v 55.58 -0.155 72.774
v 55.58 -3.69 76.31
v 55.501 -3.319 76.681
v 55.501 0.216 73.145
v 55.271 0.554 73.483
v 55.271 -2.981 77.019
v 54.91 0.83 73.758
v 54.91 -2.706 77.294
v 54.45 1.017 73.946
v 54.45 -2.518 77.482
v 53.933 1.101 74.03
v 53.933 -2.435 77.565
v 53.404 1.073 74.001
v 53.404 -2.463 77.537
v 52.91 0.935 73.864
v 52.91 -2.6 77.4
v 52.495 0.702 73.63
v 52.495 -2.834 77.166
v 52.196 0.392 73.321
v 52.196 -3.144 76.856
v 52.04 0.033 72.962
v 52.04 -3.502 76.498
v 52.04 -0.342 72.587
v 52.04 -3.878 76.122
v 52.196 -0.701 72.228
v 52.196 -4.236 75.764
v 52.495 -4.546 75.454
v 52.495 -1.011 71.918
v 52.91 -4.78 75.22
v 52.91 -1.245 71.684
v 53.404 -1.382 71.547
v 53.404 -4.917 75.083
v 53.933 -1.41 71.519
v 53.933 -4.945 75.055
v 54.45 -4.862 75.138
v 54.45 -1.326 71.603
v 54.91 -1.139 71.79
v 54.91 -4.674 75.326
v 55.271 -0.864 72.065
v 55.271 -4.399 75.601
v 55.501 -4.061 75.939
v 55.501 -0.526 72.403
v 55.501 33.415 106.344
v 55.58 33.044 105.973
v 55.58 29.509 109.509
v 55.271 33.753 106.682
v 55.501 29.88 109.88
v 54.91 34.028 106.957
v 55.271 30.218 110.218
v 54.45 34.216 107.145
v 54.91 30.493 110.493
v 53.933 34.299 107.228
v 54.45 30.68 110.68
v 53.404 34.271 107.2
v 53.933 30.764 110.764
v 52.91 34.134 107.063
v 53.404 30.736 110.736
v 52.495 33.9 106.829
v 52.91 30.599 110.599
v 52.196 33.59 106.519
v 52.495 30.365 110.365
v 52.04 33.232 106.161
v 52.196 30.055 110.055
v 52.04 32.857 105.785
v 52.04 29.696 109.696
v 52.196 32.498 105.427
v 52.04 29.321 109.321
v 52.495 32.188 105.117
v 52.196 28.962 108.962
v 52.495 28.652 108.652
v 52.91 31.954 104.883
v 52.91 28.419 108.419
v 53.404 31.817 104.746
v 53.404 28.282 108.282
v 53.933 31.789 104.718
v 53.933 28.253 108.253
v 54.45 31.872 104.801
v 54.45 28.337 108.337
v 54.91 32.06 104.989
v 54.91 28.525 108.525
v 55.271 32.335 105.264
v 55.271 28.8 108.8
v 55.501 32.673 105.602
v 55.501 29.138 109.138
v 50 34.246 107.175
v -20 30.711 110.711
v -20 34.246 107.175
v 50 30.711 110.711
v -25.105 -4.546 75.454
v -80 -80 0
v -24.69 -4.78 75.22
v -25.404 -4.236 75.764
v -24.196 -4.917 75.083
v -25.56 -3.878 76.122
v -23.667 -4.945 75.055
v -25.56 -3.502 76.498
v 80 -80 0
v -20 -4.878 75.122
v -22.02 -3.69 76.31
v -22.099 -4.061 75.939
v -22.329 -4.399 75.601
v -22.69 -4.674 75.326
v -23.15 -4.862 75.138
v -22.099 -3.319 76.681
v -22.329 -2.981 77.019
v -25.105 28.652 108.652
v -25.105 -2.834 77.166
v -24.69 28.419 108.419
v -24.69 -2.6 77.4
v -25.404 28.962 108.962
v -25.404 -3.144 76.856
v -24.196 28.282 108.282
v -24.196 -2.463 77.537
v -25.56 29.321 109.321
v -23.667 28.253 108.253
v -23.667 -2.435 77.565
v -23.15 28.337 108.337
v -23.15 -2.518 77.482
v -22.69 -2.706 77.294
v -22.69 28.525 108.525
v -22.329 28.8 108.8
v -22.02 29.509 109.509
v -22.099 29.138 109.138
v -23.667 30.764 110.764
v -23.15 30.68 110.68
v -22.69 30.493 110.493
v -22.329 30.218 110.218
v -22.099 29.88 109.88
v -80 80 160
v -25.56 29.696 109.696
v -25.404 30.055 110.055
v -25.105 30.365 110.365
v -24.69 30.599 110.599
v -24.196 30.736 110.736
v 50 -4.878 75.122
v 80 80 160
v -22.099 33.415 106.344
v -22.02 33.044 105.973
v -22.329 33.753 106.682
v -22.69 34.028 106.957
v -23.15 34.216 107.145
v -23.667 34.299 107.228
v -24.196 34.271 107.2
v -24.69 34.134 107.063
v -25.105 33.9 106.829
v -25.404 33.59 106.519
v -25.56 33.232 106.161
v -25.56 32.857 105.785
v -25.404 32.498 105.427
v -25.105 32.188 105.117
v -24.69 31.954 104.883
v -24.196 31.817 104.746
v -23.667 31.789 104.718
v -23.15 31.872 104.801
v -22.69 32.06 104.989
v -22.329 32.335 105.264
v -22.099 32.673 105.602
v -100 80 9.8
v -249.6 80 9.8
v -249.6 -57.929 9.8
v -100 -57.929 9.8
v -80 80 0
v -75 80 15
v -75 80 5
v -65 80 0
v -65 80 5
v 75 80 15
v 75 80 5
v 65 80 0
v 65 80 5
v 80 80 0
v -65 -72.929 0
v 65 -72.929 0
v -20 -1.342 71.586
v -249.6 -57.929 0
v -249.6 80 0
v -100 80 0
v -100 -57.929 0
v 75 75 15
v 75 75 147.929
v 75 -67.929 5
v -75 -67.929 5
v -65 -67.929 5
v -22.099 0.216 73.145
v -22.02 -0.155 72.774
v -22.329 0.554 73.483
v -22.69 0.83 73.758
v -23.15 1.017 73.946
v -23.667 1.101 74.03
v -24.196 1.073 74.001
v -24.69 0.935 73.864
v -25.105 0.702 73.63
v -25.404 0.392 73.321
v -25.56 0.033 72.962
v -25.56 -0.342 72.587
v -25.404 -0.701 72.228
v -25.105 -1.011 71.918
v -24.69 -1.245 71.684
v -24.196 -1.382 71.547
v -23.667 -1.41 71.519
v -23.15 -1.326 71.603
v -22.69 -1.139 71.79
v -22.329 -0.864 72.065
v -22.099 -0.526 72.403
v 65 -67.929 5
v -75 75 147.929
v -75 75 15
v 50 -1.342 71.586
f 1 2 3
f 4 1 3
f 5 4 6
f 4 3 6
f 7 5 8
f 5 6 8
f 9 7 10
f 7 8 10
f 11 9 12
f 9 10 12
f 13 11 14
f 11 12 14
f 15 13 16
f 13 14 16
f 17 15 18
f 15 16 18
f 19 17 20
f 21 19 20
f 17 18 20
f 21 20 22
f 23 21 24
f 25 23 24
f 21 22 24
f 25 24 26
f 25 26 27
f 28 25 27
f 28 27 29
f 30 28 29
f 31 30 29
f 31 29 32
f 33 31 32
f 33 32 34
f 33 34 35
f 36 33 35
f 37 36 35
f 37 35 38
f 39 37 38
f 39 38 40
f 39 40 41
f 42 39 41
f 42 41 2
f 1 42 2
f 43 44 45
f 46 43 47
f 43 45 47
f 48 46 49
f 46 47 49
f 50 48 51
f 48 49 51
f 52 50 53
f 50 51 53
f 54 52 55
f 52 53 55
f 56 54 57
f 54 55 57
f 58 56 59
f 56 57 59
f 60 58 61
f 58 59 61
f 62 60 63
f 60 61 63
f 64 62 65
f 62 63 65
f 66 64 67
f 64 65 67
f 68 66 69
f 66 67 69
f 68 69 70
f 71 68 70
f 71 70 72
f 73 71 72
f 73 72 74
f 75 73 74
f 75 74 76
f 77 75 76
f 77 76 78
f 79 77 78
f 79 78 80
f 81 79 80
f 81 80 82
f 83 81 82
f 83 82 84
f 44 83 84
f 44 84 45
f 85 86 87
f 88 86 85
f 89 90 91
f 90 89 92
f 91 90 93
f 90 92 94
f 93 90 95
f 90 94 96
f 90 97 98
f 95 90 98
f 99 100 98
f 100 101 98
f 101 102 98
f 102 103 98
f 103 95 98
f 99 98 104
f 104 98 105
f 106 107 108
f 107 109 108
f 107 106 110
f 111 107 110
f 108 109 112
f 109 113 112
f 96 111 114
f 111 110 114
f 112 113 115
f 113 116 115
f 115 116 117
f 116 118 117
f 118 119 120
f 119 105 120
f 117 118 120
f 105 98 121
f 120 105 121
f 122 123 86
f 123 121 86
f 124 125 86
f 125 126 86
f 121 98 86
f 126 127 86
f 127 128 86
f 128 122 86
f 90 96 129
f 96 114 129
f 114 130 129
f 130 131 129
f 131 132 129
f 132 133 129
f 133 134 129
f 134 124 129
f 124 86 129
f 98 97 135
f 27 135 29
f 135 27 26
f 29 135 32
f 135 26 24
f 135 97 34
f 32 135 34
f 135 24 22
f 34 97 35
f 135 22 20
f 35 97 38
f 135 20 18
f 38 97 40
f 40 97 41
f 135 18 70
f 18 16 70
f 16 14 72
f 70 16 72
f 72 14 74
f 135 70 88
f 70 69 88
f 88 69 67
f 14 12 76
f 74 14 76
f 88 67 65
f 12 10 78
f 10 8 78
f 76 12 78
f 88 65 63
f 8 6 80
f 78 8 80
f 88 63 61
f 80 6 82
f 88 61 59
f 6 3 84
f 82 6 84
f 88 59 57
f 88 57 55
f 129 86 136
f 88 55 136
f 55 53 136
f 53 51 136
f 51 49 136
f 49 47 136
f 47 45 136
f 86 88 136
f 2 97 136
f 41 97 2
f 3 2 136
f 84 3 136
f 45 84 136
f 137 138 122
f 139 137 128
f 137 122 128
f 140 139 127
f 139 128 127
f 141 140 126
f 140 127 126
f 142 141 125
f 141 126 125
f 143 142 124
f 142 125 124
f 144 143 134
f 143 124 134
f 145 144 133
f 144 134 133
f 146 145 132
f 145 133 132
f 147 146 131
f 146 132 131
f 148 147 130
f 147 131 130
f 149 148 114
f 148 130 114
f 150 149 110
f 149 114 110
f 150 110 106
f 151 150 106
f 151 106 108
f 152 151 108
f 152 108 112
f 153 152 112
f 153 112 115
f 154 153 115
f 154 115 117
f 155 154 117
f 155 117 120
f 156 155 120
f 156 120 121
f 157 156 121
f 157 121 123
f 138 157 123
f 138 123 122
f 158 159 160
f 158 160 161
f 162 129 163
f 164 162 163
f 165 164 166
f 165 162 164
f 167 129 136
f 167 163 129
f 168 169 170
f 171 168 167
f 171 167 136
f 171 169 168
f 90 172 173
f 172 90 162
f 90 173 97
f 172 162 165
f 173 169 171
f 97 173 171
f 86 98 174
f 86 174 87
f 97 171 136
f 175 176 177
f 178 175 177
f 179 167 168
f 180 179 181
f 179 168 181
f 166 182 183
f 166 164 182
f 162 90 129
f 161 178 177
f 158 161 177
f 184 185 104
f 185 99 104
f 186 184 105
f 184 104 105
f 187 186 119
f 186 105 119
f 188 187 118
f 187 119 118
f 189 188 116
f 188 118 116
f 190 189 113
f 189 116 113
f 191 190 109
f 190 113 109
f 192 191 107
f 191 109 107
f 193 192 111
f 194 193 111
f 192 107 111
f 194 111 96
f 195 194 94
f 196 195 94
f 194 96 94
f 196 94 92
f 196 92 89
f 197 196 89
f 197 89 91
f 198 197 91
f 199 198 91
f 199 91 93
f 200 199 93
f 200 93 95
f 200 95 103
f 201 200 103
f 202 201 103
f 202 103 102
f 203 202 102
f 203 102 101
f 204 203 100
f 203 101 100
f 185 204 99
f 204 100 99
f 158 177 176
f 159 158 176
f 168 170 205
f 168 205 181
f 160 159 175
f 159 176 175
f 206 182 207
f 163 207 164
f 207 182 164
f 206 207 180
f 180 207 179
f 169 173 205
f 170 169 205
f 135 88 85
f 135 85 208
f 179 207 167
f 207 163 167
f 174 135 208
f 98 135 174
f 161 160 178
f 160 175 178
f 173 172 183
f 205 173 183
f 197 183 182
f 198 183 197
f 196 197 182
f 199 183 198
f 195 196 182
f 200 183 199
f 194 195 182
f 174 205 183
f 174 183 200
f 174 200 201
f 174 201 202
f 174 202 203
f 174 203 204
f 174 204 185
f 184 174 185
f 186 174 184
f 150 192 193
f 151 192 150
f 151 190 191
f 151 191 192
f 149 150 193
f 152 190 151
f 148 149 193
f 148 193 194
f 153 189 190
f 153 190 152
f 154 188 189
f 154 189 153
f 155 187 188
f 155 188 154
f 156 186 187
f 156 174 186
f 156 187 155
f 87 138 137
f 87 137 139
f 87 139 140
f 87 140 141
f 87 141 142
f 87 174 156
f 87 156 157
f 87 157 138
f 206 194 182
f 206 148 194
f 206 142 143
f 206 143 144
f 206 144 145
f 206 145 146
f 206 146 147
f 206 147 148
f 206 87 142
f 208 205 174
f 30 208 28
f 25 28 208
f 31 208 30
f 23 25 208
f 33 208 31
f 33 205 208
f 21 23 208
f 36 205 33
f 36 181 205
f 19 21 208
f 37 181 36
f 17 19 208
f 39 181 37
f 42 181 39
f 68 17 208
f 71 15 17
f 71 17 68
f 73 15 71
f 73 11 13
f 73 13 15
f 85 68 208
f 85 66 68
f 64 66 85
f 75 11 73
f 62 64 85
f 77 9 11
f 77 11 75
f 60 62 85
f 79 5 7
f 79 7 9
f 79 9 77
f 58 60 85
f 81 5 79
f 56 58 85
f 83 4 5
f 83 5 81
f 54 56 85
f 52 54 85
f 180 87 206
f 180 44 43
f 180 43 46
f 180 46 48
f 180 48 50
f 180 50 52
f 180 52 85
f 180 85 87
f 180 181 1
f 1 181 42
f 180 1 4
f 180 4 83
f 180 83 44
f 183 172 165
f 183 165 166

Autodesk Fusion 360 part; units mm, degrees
sketch "Sketch1" plane through (0, 0, 0) normal (0, 0, 1) x (1, 0, 0)
  line L0 (80, -80) -> (-80, -80)
  line L1 (-80, -80) -> (-80, 80)
  line L2 (-80, 80) -> (80, 80)
  line L3 (80, 80) -> (80, -80)
  line L4 (80, -80) -> (-80, 80) construction
  line L5 (-80, -80) -> (80, 80) construction
  dimension "d1" = 160
  dimension "d2" = 160
extrude "Extrude1" add sketch "Sketch1" along normal blind 160 makes body 1
sketch "Sketch2" plane through (80, 0, 0) normal (1, 0, 0) x (0, 1, 0)
  line L0 (-80, 0) -> (80, 0)
  line L1 (80, 0) -> (80, 160)
  line L2 (80, 160) -> (-80, 160)
  line L3 (-80, 160) -> (-80, 0)
  line L4 (-80, 0) -> (80, 160)
  line L5 (80, 160) -> (-80, 160)
  line L6 (-80, 160) -> (-80, 0)
extrude "Extrude2" cut sketch "Sketch2" against normal blind 160 contours L2 L3 L4 L5 L6 bodies 1
shell "Shell1" thickness 5 removed faces 1 at (26.6667, -26.6667, 0) on bodies 1
sketch "Sketch3" plane through (0, 80, 0) normal (0, 1, 0) x (-1, 0, 0)
  line L0 (-80, 0) -> (80, 0)
  line L1 (80, 0) -> (80, 160)
  line L2 (80, 160) -> (-80, 160)
  line L3 (-80, 160) -> (-80, 0)
  line L4 (-80, 0) -> (-80, 5)
  line L5 (80, 0) -> (80, 5)
  line L6 (-80, 0) -> (-65, 0)
  line L7 (80, 0) -> (65, 0)
  line L8 (65, 0) -> (65, 5)
  line L9 (65, 5) -> (75, 5)
  line L10 (75, 5) -> (75, 15)
  line L11 (75, 15) -> (-75, 15)
  line L12 (-75, 15) -> (-75, 5)
  line L13 (-75, 5) -> (-65, 5)
  line L14 (-65, 5) -> (-65, 0)
  line L15 (-65, 0) -> (65, 0)
extrude "Extrude3" cut sketch "Sketch3" against normal blind 5 contours L0 L8 L9 L10 L11 L12 L13 L14 L15 bodies 1
sketch "Sketch4" plane through (0, 80, 0) normal (0, 1, 0) x (-1, 0, 0)
  line L0 (-65, 0) -> (-65, 5)
  line L1 (-65, 5) -> (-75, 5)
  line L2 (-75, 5) -> (-75, 15)
  line L3 (-75, 15) -> (75, 15)
  line L4 (75, 15) -> (75, 5)
  line L5 (75, 5) -> (65, 5)
  line L6 (65, 5) -> (65, 0)
  line L7 (65, 0) -> (80, 0)
  line L8 (80, 0) -> (80, 160)
  line L9 (80, 160) -> (-80, 160)
  line L10 (-80, 160) -> (-80, 0)
  line L11 (-80, 0) -> (-65, 0)
  line L12 (-75, 5) -> (-65, 5)
  line L13 (-65, 0) -> (-75, 0)
  line L14 (-75, 5) -> (-75, 0)
  line L15 (65, 5) -> (75, 5)
  line L16 (75, 0) -> (65, 0)
  line L17 (65, 5) -> (65, 0)
  line L18 (75, 5) -> (75, 0)
extrude "Extrude4" add sketch "Sketch4" against normal blind 155 contours L0 L1 L11 L12 L13 L14 | L5 L6 L7 L15 L16 L17 L18 bodies 1
sketch "Sketch5" plane through (0, -40, 40) normal (0, -0.7071, 0.7071) x (1, 0, 0)
  line L0 (80, -56.5685) -> (80, 169.7056)
  line L1 (80, 169.7056) -> (-80, 169.7056)
  line L2 (-80, 169.7056) -> (-80, -56.5685)
  line L3 (-80, -56.5685) -> (80, -56.5685)
  line L4 (80, 169.7056) -> (50, 169.7056)
  line L5 (50, 169.7056) -> (50, 100)
  line L6 (50, 100) -> (80, 100)
  line L7 (50, 169.7056) -> (-20, 169.7056)
  line L8 (-20, 100) -> (-20, 169.7056)
  line L9 (-20, 100) -> (50, 100)
  line L10 (-20, 100) -> (-80, 100)
  line L11 (-20, 100) -> (50, 100)
  line L12 (50, 100) -> (50, 49.67)
  line L13 (50, 49.67) -> (-20, 49.67)
  line L14 (-20, 49.67) -> (-20, 100)
  line L15 (-20, 100) -> (50, 100)
  line L16 (50, 100) -> (50, 98.3)
  line L17 (50, 98.3) -> (53.8, 98.3)
  circle A0 centre (53.8, 98.3) radius 1.78
  line L18 (-20, 100) -> (-23.8, 100)
  line L19 (-20, 100) -> (-20, 98.3)
  line L20 (-23.8, 100) -> (-23.8, 98.3)
  line L21 (-23.8, 98.3) -> (-20, 98.3)
  circle A1 centre (-23.8, 98.3) radius 1.78
  line L22 (-20, 49.67) -> (-20, 51.35)
  line L23 (-20, 49.67) -> (-23.8, 49.67)
  line L24 (-23.8, 49.67) -> (-23.8, 51.35)
  line L25 (-23.8, 51.35) -> (-20, 51.35)
  circle A2 centre (-23.8, 51.35) radius 1.78
  line L26 (50, 49.67) -> (53.8, 49.67)
  line L27 (50, 49.67) -> (50, 51.35)
  line L28 (50, 51.35) -> (53.8, 51.35)
  line L29 (53.8, 51.35) -> (53.8, 49.67)
  circle A3 centre (53.8, 51.35) radius 1.78
  dimension "d12" = 50.33
  dimension "d13" = 1.7
  dimension "d14" = 3.8
  dimension "d15" = 3.56
  dimension "d16" = 3.8
  dimension "d17" = 1.7
  dimension "d18" = 1.7
  dimension "d19" = 3.8
  dimension "d20" = 3.56
  dimension "d21" = 1.68
  dimension "d22" = 3.8
  dimension "d23" = 1.68
  dimension "d24" = 3.56
  dimension "d25" = 3.8
  dimension "d26" = 1.68
  dimension "d27" = 3.8
  dimension "d28" = 1.68
  dimension "d29" = 3.56
extrude "Extrude5" cut sketch "Sketch5" against normal blind 5 contours L6 A0 | L6 A0 | L10 L18 A1 | L10 L20 L21 A1 | L9 L11 L12 L13 L14 L15 L16 L19 L22 L27 | L10 L18 L20 L21 A1 | L26 L28 L29 A3 | L26 L28 L29 A3 | L23 L24 L25 A2 | L23 L24 L25 A2 bodies 1
sketch "Sketch6" plane through (0, 0, 0) normal (0, 0, 1) x (1, 0, 0)
  line L0 (-100, 80) -> (-249.6, 80)
  line L1 (-249.6, 80) -> (-249.6, -57.9289)
  line L2 (-249.6, -57.9289) -> (-100, -57.9289)
  line L3 (-100, -57.9289) -> (-100, 80)
  dimension "d32" = 149.6
  dimension "d33" = 137.9289
extrude "Extrude6" add sketch "Sketch6" along normal blind 9.8 separate body makes body 2
equation "d15 = 1.78 mm * 2"
equation "d20 = ( 1.78 * 2 ) * 1 mm"
equation "d33 = 145 mm - 7.07107 mm"
